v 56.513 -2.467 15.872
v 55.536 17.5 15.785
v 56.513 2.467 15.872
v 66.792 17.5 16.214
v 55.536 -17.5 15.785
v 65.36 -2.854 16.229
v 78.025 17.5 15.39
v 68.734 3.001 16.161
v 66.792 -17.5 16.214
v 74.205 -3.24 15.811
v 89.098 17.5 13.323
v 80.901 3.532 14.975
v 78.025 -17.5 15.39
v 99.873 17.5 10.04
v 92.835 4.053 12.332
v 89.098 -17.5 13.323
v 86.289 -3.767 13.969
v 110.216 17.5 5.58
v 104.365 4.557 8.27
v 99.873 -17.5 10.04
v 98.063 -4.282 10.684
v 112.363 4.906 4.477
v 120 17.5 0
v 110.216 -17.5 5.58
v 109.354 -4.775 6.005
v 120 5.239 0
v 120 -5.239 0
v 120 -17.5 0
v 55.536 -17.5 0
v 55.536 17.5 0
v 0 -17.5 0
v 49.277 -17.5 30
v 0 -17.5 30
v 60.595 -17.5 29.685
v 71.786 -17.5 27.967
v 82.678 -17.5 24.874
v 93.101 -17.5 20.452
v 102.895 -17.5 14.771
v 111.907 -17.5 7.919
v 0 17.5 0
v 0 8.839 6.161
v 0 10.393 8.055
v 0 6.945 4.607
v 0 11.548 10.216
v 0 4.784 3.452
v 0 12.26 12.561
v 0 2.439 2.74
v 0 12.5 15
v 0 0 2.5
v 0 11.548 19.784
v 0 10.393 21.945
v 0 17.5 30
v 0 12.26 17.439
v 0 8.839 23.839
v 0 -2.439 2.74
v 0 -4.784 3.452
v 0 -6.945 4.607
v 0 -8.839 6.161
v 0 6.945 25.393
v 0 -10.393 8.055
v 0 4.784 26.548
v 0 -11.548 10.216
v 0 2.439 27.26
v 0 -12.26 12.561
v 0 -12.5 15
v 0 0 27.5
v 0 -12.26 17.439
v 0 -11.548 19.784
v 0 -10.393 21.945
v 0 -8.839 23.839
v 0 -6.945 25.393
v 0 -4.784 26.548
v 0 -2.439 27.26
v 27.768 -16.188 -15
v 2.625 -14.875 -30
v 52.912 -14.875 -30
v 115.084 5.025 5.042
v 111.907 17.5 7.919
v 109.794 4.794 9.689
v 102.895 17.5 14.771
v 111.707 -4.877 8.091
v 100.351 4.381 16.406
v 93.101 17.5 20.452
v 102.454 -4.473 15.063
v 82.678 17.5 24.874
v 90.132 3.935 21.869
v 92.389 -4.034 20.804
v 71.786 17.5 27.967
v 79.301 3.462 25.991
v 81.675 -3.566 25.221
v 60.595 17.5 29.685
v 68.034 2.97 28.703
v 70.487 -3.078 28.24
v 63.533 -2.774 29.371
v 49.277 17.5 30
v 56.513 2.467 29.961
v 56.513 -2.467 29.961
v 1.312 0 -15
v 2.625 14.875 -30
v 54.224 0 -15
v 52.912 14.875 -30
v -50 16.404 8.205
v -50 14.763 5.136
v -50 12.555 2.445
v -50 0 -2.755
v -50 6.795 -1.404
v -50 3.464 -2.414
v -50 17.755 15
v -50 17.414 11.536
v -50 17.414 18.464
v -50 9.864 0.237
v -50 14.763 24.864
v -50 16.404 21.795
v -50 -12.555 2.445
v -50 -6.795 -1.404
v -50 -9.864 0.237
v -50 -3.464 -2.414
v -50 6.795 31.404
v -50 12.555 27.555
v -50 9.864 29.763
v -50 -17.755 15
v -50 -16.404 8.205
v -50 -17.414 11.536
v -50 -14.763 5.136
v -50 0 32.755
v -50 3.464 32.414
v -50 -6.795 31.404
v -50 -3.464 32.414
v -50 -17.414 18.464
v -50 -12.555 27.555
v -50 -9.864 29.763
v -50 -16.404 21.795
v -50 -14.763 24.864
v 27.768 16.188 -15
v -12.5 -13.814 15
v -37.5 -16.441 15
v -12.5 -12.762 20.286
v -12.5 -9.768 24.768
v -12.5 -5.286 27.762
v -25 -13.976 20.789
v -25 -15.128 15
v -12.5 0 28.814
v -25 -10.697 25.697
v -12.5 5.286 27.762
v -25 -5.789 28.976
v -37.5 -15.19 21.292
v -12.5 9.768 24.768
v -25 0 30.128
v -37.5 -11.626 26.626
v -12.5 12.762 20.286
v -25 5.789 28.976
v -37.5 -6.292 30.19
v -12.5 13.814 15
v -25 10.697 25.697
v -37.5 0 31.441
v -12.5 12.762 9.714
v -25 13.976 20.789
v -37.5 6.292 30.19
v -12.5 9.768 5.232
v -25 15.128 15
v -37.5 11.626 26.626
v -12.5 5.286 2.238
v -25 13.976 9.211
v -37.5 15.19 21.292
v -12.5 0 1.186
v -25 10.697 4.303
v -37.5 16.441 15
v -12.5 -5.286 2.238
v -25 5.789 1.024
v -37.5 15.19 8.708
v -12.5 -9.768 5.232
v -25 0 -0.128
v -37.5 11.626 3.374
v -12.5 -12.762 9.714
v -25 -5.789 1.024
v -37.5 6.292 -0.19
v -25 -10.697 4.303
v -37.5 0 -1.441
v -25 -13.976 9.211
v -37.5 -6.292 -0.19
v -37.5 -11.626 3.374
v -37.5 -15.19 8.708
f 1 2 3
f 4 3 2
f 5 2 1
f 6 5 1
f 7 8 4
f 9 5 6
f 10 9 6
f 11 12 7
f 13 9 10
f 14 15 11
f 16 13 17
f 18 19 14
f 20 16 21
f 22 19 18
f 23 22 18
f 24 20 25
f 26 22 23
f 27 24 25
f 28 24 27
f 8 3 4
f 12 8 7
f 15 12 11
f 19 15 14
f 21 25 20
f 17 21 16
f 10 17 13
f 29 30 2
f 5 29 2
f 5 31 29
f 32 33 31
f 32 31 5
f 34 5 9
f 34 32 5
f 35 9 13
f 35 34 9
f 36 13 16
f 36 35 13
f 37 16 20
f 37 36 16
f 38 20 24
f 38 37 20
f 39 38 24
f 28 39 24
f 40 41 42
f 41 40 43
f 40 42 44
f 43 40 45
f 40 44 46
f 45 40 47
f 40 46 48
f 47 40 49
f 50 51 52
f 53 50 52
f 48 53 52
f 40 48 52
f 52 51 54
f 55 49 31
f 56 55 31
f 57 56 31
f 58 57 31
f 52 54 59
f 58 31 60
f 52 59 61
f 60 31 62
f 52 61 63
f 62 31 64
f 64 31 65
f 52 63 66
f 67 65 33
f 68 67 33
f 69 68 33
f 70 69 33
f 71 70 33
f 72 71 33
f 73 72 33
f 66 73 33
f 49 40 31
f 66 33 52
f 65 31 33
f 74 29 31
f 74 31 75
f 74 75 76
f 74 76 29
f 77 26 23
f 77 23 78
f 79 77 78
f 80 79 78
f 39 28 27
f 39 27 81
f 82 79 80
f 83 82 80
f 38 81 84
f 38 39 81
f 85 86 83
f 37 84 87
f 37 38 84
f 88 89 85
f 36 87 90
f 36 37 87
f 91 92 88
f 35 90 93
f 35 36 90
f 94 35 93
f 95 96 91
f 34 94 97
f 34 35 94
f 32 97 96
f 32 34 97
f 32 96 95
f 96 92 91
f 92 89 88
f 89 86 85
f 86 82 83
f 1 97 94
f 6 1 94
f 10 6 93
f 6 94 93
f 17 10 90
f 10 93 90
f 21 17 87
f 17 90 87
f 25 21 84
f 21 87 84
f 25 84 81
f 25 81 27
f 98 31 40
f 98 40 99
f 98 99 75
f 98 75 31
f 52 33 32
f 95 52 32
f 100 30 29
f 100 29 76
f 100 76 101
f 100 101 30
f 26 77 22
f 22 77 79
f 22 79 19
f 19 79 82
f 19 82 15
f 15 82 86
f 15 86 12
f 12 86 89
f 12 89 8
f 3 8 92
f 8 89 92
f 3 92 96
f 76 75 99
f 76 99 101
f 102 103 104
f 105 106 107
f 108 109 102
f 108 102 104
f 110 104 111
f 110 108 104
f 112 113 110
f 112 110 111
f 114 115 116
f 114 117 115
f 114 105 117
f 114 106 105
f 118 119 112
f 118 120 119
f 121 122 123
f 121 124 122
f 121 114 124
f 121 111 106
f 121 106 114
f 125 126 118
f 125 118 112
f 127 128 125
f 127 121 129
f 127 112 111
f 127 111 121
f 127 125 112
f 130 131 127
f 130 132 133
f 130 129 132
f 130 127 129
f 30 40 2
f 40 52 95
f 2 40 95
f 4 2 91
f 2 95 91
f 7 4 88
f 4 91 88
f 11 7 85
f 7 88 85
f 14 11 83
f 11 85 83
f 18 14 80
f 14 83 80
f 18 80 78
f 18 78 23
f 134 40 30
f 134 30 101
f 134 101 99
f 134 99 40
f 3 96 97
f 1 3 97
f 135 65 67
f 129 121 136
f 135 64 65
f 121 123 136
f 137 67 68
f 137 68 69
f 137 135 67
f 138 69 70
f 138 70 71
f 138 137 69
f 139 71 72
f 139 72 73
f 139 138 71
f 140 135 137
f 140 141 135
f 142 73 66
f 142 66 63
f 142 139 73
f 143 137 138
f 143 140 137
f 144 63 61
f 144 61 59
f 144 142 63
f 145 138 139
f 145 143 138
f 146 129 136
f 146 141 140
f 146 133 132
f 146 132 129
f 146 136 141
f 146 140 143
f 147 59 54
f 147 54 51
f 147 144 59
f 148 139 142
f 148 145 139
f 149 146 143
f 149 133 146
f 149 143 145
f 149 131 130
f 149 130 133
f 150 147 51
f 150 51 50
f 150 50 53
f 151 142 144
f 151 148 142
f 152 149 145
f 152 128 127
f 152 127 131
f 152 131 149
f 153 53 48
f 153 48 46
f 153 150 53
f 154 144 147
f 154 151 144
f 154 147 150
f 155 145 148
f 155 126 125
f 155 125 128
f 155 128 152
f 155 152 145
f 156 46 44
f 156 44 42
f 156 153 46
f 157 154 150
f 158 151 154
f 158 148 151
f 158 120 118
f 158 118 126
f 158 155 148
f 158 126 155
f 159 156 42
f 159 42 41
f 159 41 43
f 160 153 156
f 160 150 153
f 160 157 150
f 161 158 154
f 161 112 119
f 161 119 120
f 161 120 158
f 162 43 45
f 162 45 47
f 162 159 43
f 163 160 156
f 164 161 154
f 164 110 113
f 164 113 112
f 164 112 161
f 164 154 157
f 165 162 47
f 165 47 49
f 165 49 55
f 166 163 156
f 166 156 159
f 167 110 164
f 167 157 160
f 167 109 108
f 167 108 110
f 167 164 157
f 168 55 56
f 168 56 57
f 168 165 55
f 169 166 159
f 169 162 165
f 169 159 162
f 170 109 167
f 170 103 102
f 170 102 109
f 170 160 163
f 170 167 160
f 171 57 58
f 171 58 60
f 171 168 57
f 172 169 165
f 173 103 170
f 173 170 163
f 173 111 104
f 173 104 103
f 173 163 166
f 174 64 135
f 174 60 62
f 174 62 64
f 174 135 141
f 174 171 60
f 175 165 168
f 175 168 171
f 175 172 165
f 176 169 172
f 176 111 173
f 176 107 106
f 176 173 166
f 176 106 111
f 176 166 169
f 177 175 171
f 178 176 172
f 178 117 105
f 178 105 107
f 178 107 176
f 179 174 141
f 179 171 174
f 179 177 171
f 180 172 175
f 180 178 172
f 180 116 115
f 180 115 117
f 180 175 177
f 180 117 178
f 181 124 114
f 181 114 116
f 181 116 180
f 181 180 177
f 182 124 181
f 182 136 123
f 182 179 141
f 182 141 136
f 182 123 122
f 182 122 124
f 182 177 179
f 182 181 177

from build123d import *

# Parameters (mm, degrees)
F0_W      = 55.5363558233
F0_H      = 30
F1_DEPTH  = 17.5
F1_FACE_W = 55.5363558233
F1_FACE_H = 35
F2_DEPTH  = 30
F2_TAPER  = 5
F3_R      = 12.5
F4_DEPTH  = 50
F4_TAPER  = -6
F6_DEPTH  = 35
F8_DEPTH  = 35


with BuildPart() as f1:
    # F0 (on Front) → F1 (new body, symmetric)
    with BuildSketch(Plane.XZ):
        with Locations((27.7681779116, 15)):
            Rectangle(F0_W, F0_H)
    extrude(amount=F1_DEPTH, both=True)

    # F1_face (on face) → F2 (join)
    with BuildSketch(Plane(origin=(27.7681779116, 0, 0), x_dir=(1, 0, 0), z_dir=(0, 0, -1))):
        Rectangle(F1_FACE_W, F1_FACE_H)
    extrude(amount=F2_DEPTH, taper=F2_TAPER)

    # F3 (on face) → F4 (join)
    with BuildSketch(Plane(origin=(0, 0, 0), x_dir=(0, -1, 0), z_dir=(-1, 0, 0))):
        with Locations((0, 15)):
            Circle(F3_R)
    extrude(amount=F4_DEPTH, taper=F4_TAPER)

    # F5 (on face) → F6 (join)
    with BuildSketch(Plane.XZ.offset(17.5)):
        with BuildLine():
            ThreePointArc((120, 0), (87.9580104682, 22.8252746923), (49.2771938443, 30))
            Line((49.2771938443, 30), (49.2771938443, 15))
            ThreePointArc((49.2771938443, 15), (86.0226572611, 14.0256420707), (120, 0))
        make_face()
    extrude(amount=-F6_DEPTH)

    # F7 (on face) → F8 (cut)
    with BuildSketch(Plane.XY.offset(30)):
        Polygon((147.9074739632, 6.4577797765), (56.5133458154, 2.4674259652), (56.5133458154, -2.4674259652), (147.8689167317, -6.4560963314), align=None)
    extrude(amount=-F8_DEPTH, mode=Mode.SUBTRACT)


solid = f1.part
